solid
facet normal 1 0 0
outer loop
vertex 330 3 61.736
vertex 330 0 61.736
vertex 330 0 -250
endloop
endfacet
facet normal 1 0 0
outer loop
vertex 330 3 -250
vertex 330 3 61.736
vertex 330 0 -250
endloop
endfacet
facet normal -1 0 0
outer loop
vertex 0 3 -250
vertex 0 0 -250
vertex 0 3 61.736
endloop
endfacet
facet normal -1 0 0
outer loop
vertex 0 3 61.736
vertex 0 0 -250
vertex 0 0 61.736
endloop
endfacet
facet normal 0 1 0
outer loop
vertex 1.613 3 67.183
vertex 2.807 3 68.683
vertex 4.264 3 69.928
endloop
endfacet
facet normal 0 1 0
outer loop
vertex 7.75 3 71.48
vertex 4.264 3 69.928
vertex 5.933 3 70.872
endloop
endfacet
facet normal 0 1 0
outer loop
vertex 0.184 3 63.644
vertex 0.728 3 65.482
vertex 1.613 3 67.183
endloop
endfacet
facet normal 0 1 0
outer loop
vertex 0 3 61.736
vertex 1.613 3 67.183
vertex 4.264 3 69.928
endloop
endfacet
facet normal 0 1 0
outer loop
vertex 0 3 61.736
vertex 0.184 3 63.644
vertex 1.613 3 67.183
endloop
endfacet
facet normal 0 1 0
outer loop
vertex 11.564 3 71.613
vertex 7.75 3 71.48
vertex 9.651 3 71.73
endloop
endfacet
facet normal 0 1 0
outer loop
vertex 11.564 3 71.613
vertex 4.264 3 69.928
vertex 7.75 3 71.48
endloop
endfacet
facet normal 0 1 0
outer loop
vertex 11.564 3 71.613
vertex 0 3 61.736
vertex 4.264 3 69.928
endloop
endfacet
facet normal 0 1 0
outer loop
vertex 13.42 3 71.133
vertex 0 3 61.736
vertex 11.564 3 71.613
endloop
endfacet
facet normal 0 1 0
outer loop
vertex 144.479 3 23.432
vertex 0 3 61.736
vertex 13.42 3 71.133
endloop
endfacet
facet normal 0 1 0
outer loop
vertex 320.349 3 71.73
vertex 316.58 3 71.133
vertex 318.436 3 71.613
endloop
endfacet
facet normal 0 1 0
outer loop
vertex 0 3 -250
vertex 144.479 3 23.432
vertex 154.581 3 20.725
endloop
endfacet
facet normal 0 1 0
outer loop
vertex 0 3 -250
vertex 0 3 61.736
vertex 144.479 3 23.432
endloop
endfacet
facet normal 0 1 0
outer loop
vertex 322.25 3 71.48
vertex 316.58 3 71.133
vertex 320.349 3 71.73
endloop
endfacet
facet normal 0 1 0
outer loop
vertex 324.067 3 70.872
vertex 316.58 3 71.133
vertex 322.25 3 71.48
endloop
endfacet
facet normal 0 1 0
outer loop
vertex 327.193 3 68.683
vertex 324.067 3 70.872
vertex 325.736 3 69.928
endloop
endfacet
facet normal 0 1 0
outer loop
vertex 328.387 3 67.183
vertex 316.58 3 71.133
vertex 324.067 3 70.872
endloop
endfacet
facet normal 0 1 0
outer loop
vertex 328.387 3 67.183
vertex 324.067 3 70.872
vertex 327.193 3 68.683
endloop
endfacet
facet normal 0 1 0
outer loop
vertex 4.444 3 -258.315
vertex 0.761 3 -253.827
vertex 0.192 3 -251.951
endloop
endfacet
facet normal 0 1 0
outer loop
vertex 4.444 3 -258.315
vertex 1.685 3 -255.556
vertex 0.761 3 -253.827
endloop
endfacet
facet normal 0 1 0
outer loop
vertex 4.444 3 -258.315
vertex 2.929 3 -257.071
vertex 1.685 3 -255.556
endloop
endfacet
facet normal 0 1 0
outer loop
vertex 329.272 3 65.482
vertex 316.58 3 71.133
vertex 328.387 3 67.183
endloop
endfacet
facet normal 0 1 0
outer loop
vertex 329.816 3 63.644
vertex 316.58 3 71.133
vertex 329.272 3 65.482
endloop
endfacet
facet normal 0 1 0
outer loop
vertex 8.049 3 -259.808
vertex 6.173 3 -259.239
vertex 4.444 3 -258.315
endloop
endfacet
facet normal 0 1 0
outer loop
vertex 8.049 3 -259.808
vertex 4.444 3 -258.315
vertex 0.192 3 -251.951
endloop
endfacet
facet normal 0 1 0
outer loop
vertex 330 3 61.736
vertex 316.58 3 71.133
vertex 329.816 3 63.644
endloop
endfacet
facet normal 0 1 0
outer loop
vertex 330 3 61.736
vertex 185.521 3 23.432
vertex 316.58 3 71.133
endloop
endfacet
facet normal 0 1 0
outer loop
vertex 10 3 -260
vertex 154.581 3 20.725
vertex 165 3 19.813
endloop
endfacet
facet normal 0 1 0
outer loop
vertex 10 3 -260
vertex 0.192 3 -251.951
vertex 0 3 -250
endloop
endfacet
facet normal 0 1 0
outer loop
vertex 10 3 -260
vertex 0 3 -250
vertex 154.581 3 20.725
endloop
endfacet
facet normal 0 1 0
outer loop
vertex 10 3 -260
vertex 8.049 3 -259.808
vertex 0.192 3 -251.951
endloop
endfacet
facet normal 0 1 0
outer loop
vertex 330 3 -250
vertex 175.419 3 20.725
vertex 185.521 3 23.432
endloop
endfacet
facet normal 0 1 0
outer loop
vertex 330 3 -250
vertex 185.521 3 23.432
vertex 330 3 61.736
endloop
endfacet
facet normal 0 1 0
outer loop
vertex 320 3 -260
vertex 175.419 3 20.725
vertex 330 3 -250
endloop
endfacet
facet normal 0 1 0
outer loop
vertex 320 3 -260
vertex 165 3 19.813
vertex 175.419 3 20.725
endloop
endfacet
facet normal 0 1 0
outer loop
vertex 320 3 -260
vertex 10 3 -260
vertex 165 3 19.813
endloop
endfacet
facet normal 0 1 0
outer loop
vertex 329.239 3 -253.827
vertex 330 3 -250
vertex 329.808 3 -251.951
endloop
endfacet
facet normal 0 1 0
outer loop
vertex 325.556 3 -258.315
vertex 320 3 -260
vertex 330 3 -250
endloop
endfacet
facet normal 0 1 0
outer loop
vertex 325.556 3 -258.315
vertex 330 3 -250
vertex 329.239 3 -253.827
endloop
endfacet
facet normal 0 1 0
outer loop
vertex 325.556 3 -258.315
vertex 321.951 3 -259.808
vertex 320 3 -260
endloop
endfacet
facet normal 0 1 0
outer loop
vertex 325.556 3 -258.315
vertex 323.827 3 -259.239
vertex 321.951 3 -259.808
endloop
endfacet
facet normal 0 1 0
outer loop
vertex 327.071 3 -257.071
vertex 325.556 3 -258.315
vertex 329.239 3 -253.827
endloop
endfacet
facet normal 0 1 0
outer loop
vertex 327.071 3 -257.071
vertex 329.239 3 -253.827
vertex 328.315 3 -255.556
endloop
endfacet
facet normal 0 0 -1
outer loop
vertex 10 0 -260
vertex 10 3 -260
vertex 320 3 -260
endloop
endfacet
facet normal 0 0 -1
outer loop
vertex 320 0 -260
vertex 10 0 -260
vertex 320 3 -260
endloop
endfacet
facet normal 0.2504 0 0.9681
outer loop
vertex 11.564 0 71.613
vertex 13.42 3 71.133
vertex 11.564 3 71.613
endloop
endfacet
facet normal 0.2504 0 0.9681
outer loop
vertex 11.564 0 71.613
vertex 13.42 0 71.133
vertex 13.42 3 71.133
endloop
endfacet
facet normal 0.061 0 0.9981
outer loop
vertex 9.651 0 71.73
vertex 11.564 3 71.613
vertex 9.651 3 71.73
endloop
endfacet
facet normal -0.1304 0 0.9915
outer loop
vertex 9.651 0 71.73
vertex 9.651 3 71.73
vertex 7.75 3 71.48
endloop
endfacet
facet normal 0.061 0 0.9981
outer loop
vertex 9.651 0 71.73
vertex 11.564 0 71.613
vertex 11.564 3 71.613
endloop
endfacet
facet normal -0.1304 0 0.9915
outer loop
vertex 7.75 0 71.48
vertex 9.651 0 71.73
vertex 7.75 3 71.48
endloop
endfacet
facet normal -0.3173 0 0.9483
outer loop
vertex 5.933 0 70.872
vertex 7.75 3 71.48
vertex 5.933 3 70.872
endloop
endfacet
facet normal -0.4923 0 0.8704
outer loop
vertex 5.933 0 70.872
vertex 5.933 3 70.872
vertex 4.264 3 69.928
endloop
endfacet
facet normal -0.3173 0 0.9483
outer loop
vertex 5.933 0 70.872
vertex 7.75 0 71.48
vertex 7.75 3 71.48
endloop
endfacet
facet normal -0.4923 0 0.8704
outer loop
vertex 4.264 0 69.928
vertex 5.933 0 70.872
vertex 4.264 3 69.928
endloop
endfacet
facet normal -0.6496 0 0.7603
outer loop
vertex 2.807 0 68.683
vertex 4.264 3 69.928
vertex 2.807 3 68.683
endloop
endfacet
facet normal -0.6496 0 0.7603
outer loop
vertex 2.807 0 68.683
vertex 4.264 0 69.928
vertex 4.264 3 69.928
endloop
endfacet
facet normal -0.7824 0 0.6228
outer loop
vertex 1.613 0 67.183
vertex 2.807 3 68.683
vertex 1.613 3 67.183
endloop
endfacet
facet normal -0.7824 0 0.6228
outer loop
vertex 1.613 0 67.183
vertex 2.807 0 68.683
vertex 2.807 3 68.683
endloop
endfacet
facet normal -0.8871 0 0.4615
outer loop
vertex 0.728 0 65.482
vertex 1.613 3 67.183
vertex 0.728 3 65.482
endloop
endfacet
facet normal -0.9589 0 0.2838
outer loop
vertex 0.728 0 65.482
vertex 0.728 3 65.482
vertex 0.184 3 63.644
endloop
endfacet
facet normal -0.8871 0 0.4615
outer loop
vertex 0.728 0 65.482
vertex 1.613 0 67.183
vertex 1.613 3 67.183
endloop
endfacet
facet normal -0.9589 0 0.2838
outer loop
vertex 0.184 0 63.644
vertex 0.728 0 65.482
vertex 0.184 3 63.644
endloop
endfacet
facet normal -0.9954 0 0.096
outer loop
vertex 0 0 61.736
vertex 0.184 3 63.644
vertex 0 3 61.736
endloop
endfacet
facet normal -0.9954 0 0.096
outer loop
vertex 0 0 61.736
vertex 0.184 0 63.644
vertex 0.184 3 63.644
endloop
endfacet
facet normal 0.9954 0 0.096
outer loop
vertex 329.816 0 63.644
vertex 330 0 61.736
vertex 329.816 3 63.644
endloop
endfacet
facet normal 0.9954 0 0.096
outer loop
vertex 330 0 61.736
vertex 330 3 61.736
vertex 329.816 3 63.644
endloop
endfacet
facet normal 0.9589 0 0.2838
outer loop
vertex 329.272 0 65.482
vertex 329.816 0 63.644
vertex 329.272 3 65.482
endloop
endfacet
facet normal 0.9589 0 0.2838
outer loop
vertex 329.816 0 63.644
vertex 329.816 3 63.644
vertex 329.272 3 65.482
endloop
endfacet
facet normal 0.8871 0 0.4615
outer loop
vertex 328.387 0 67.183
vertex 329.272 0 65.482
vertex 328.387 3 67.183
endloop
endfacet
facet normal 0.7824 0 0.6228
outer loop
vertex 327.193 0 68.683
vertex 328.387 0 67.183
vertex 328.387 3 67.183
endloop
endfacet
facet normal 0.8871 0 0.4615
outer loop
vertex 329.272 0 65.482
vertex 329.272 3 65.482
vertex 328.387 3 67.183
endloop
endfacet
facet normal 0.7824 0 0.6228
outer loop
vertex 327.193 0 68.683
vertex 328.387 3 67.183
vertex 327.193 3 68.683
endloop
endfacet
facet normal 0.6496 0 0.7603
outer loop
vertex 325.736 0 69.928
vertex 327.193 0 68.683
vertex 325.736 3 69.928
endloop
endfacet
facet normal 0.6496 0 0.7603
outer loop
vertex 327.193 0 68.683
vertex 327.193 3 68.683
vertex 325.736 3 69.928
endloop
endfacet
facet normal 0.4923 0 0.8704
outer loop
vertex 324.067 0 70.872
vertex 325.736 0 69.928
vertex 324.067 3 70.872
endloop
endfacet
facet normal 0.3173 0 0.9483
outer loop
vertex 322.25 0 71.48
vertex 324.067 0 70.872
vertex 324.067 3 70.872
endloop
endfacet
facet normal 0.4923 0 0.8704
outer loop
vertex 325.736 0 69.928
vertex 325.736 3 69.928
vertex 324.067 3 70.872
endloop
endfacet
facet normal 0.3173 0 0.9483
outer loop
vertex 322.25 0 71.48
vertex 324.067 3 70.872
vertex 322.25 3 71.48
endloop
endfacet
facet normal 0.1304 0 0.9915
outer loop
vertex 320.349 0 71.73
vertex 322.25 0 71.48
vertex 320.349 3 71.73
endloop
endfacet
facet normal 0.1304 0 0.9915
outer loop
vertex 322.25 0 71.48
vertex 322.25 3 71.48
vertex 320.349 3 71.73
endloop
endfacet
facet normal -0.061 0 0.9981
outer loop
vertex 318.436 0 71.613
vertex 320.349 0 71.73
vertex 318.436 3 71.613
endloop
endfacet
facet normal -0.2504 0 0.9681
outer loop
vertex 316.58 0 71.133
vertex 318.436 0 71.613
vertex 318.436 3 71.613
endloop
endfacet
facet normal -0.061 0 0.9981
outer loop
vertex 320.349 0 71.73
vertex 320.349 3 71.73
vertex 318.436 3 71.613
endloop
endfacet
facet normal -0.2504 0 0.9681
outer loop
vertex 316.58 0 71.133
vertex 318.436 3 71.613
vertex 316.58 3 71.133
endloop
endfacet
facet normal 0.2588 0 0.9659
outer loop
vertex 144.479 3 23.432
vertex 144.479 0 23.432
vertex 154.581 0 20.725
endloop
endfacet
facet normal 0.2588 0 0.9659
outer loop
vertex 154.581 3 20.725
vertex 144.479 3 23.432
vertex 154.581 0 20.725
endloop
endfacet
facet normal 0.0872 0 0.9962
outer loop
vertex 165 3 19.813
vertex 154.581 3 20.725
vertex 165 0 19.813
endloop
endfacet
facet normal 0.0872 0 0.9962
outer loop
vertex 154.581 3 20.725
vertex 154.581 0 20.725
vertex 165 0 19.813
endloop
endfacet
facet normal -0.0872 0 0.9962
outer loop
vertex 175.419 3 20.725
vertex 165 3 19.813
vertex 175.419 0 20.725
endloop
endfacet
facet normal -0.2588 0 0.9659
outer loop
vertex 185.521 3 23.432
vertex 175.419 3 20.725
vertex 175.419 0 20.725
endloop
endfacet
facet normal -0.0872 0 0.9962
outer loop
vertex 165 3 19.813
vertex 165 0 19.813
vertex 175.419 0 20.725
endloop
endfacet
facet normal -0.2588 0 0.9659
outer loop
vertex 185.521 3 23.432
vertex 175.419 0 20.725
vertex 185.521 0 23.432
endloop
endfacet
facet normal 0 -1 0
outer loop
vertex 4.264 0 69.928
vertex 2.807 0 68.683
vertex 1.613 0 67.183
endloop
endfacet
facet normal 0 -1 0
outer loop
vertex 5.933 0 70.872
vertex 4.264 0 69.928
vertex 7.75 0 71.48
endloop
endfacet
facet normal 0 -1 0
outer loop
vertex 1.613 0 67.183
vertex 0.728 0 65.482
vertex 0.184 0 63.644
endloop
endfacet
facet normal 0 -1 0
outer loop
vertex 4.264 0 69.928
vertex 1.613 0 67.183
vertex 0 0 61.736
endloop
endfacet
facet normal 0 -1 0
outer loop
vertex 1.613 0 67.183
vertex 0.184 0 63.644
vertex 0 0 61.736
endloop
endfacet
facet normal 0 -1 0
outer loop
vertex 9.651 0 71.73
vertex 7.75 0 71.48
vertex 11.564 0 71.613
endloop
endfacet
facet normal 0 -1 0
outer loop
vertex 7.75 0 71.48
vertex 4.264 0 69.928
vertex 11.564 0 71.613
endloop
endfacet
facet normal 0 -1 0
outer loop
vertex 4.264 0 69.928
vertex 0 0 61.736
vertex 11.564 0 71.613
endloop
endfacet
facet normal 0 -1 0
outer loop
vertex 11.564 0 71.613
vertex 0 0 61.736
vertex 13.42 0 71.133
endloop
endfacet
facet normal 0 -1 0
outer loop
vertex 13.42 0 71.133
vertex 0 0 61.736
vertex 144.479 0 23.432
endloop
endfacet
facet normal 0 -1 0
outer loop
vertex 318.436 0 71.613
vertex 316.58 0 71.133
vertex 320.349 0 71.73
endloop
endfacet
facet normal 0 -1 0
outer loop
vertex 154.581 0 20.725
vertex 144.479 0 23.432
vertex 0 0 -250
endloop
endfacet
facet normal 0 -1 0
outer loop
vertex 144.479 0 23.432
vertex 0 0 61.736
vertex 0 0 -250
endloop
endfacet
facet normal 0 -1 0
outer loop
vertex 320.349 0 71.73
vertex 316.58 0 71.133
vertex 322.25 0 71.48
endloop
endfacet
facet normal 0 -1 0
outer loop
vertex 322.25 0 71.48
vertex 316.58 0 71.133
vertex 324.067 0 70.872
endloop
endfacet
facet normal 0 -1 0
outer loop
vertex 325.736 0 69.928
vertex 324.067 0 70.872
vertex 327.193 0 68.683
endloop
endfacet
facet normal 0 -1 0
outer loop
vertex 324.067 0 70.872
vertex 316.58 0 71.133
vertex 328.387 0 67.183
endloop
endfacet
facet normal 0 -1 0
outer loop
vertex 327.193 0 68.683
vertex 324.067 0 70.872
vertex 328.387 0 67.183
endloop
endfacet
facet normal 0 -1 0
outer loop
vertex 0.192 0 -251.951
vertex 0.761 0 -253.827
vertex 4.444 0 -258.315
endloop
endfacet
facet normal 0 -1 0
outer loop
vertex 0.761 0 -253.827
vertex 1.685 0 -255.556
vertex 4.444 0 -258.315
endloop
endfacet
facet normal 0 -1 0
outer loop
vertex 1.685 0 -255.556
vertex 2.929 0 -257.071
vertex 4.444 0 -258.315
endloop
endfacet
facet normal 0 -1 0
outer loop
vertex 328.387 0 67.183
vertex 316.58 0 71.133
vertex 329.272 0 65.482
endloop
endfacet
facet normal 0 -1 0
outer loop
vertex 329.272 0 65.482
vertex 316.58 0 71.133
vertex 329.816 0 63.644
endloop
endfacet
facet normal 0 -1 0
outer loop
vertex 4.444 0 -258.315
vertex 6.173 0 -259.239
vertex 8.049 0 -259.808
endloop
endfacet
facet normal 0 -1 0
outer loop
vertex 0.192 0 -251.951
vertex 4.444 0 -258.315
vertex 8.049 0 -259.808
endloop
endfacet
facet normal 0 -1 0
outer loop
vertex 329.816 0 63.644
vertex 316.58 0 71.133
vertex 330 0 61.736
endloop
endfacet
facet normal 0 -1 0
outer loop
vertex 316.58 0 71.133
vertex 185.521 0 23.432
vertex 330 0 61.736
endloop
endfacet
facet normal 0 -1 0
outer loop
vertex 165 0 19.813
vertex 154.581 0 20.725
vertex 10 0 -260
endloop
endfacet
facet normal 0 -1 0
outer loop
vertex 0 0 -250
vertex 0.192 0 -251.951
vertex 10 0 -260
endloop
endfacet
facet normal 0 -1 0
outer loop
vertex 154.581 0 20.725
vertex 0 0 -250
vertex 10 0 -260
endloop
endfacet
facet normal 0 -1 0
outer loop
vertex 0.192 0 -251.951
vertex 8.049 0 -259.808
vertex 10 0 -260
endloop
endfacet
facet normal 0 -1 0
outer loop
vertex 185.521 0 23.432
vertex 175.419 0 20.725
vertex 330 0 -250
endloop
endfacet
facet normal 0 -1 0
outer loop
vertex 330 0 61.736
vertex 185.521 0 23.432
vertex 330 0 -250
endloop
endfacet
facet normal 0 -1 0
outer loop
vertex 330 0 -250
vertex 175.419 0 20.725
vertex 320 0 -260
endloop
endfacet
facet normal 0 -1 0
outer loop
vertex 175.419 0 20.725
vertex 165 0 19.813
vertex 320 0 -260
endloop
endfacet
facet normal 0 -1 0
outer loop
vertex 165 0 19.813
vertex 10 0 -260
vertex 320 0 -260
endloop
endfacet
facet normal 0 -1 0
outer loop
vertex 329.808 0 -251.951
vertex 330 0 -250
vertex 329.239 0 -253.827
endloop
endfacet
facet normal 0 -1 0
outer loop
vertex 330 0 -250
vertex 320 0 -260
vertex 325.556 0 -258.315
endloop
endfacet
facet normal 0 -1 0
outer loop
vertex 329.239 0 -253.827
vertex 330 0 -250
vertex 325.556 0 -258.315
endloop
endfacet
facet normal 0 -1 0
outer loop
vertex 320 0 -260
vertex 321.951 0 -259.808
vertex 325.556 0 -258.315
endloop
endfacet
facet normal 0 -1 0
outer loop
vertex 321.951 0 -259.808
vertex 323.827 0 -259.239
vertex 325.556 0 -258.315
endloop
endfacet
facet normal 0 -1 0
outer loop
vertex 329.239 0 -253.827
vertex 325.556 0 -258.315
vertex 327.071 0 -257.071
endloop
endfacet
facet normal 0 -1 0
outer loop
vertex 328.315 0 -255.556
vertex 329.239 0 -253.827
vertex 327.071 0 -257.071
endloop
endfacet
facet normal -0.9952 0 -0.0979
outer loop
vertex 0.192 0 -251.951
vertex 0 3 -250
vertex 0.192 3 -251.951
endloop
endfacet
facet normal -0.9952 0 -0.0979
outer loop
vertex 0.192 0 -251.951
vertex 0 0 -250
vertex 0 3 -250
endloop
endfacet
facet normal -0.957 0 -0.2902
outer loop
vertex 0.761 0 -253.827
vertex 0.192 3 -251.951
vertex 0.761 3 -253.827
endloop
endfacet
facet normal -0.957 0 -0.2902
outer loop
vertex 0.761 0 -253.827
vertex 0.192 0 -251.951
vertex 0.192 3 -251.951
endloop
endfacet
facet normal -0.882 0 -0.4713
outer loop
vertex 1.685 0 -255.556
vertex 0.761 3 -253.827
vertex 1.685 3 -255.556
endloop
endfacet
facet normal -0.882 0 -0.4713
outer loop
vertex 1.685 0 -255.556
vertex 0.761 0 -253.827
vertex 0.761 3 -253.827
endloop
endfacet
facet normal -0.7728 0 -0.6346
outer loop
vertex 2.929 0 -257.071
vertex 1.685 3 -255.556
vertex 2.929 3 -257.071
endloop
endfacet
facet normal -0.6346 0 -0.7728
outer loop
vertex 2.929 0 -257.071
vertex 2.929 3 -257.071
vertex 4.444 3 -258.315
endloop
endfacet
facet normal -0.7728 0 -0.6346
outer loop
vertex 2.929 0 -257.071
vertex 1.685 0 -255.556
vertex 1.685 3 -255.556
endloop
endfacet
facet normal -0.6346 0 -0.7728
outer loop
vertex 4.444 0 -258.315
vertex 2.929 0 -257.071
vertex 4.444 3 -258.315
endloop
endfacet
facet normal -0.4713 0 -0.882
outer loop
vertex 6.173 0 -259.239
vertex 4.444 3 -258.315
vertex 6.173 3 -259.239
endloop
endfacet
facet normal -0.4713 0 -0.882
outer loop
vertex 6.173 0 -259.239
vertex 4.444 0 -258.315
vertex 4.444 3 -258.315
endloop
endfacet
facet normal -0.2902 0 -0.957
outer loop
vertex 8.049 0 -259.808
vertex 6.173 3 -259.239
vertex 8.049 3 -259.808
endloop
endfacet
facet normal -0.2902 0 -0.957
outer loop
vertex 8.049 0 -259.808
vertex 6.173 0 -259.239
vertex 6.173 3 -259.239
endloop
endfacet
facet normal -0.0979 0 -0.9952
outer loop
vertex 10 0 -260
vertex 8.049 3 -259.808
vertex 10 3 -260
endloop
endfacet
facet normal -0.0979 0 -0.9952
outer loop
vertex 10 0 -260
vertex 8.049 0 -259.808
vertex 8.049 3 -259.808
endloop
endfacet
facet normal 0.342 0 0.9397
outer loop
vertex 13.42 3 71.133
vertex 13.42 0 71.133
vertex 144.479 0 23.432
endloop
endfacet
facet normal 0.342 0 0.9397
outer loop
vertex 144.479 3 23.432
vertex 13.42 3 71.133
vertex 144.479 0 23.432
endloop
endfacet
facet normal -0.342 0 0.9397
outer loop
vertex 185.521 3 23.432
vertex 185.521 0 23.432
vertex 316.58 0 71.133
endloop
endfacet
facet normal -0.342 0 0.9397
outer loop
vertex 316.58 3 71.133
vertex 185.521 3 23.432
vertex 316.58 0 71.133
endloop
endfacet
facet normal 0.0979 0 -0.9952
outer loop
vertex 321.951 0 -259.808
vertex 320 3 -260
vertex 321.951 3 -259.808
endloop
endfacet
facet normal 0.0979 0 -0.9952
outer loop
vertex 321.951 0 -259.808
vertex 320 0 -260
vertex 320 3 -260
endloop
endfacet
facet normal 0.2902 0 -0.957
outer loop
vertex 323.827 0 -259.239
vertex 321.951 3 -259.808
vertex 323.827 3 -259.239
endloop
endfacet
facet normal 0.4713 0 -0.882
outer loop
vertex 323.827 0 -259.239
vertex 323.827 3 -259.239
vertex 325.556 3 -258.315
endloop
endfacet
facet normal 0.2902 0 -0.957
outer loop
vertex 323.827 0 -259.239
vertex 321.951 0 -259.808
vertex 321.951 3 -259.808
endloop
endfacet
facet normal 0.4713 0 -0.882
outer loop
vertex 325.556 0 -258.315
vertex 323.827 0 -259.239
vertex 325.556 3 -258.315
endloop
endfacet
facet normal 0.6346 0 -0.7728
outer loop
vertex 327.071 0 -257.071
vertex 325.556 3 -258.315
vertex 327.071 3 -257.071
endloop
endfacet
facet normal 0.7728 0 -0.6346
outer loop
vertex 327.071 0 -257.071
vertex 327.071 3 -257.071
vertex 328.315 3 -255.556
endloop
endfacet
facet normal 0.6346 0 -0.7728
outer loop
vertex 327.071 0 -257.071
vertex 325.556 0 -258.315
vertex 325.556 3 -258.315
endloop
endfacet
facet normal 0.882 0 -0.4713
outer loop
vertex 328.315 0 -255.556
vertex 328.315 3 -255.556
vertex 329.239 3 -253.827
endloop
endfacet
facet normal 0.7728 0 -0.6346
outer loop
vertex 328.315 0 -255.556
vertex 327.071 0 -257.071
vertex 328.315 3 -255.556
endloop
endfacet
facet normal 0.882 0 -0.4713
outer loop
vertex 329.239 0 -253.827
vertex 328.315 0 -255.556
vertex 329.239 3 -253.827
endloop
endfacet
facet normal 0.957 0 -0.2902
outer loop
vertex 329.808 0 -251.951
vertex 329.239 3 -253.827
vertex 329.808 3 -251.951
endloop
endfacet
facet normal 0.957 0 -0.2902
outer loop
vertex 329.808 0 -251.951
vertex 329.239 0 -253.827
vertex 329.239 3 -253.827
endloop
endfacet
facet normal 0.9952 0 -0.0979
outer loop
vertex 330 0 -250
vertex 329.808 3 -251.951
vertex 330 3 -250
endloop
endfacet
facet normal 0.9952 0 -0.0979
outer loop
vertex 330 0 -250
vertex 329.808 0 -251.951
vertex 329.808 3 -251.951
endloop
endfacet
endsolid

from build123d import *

# Parameters (mm, degrees)
BOSS_EXTRUDE1_DEPTH = 3
CUT_EXTRUDE3_DEPTH  = 535.143239216
SKETCH6_W           = 330
SKETCH6_H           = 70
CUT_EXTRUDE4_DEPTH  = 467.700117849
FILLET1_R           = 10


with BuildPart() as part:
    # Sketch3 → Boss-Extrude1 (new body)
    with BuildSketch(Plane(origin=(0, 0, 0), x_dir=(1, 0, 0), z_dir=(0, 1, 0))):
        with BuildLine():
            Line((-36.319194267, -89.236860887), (144.478790315, -23.431776084))
            ThreePointArc((144.478790315, -23.431776084), (165.000000077, -19.813332936), (185.52120983, -23.431776136))
            Line((185.52120983, -23.431776136), (366.319192052, -89.236860081))
            ThreePointArc((366.319192052, -89.236860081), (416.877444894, -67.142834059), (397.269838057, -15.569346002))
            Line((397.269838057, -15.569346002), (344.206351456, 9.829836443))
            ThreePointArc((344.206351456, 9.829836443), (333.847680817, 19.053826006), (330, 32.379717841))
            Line((330, 32.379717841), (330, 330))
            Line((330, 330), (0, 330))
            Line((0, 330), (0, 32.379717841))
            ThreePointArc((0, 32.379717841), (-3.847681031, 19.053825667), (-14.206352179, 9.829836096))
            Line((-14.206352179, 9.829836096), (-67.269835876, -15.569344958))
            ThreePointArc((-67.269835876, -15.569344958), (-86.877445819, -67.142831858), (-36.319194267, -89.236860887))
        make_face()
    extrude(amount=BOSS_EXTRUDE1_DEPTH)

    # Sketch5 → Cut-Extrude3 (cut, through all)
    with BuildSketch(Plane(origin=(0, 0, 0), x_dir=(1, 0, 0), z_dir=(0, 1, 0))):
        Polygon((330, -1291.92309226), (330, -91.649156055), (330, 58.350843945), (420, 58.350843945), (420, -91.649156055), (-90, -91.649156055), (-90, 58.350843945), (0, 58.350843945), (0, -91.649156055), (0, -1291.92309226), (0, -3692.47096467), (330, -3692.47096467), align=None)
    extrude(amount=CUT_EXTRUDE3_DEPTH, mode=Mode.SUBTRACT)


with BuildPart() as cut_extrude3_kept_piece:
    # of the separate pieces the step leaves, the one the design keeps (cut_extrude3_pieces_kept)
    add(part.part.solids().sort_by_distance((0, 0, -330))[0])

    # Sketch6 → Cut-Extrude4 (cut, through all)
    with BuildSketch(Plane(origin=(0, 3, 0), x_dir=(1, 0, 0), z_dir=(0, 1, 0))):
        with Locations((165, 295)):
            Rectangle(SKETCH6_W, SKETCH6_H)
    extrude(amount=-CUT_EXTRUDE4_DEPTH, mode=Mode.SUBTRACT)

    # Fillet1
    fillet1_edges = [cut_extrude3_kept_piece.edges().sort_by_distance(p)[0] for p in [
        (330, 1.5, 76.017755241),
        (0, 1.5, -260),
        (330, 1.5, -260),
        (0, 1.5, 76.017755241),
    ]]
    fillet(fillet1_edges, radius=FILLET1_R)


solid = cut_extrude3_kept_piece.part
